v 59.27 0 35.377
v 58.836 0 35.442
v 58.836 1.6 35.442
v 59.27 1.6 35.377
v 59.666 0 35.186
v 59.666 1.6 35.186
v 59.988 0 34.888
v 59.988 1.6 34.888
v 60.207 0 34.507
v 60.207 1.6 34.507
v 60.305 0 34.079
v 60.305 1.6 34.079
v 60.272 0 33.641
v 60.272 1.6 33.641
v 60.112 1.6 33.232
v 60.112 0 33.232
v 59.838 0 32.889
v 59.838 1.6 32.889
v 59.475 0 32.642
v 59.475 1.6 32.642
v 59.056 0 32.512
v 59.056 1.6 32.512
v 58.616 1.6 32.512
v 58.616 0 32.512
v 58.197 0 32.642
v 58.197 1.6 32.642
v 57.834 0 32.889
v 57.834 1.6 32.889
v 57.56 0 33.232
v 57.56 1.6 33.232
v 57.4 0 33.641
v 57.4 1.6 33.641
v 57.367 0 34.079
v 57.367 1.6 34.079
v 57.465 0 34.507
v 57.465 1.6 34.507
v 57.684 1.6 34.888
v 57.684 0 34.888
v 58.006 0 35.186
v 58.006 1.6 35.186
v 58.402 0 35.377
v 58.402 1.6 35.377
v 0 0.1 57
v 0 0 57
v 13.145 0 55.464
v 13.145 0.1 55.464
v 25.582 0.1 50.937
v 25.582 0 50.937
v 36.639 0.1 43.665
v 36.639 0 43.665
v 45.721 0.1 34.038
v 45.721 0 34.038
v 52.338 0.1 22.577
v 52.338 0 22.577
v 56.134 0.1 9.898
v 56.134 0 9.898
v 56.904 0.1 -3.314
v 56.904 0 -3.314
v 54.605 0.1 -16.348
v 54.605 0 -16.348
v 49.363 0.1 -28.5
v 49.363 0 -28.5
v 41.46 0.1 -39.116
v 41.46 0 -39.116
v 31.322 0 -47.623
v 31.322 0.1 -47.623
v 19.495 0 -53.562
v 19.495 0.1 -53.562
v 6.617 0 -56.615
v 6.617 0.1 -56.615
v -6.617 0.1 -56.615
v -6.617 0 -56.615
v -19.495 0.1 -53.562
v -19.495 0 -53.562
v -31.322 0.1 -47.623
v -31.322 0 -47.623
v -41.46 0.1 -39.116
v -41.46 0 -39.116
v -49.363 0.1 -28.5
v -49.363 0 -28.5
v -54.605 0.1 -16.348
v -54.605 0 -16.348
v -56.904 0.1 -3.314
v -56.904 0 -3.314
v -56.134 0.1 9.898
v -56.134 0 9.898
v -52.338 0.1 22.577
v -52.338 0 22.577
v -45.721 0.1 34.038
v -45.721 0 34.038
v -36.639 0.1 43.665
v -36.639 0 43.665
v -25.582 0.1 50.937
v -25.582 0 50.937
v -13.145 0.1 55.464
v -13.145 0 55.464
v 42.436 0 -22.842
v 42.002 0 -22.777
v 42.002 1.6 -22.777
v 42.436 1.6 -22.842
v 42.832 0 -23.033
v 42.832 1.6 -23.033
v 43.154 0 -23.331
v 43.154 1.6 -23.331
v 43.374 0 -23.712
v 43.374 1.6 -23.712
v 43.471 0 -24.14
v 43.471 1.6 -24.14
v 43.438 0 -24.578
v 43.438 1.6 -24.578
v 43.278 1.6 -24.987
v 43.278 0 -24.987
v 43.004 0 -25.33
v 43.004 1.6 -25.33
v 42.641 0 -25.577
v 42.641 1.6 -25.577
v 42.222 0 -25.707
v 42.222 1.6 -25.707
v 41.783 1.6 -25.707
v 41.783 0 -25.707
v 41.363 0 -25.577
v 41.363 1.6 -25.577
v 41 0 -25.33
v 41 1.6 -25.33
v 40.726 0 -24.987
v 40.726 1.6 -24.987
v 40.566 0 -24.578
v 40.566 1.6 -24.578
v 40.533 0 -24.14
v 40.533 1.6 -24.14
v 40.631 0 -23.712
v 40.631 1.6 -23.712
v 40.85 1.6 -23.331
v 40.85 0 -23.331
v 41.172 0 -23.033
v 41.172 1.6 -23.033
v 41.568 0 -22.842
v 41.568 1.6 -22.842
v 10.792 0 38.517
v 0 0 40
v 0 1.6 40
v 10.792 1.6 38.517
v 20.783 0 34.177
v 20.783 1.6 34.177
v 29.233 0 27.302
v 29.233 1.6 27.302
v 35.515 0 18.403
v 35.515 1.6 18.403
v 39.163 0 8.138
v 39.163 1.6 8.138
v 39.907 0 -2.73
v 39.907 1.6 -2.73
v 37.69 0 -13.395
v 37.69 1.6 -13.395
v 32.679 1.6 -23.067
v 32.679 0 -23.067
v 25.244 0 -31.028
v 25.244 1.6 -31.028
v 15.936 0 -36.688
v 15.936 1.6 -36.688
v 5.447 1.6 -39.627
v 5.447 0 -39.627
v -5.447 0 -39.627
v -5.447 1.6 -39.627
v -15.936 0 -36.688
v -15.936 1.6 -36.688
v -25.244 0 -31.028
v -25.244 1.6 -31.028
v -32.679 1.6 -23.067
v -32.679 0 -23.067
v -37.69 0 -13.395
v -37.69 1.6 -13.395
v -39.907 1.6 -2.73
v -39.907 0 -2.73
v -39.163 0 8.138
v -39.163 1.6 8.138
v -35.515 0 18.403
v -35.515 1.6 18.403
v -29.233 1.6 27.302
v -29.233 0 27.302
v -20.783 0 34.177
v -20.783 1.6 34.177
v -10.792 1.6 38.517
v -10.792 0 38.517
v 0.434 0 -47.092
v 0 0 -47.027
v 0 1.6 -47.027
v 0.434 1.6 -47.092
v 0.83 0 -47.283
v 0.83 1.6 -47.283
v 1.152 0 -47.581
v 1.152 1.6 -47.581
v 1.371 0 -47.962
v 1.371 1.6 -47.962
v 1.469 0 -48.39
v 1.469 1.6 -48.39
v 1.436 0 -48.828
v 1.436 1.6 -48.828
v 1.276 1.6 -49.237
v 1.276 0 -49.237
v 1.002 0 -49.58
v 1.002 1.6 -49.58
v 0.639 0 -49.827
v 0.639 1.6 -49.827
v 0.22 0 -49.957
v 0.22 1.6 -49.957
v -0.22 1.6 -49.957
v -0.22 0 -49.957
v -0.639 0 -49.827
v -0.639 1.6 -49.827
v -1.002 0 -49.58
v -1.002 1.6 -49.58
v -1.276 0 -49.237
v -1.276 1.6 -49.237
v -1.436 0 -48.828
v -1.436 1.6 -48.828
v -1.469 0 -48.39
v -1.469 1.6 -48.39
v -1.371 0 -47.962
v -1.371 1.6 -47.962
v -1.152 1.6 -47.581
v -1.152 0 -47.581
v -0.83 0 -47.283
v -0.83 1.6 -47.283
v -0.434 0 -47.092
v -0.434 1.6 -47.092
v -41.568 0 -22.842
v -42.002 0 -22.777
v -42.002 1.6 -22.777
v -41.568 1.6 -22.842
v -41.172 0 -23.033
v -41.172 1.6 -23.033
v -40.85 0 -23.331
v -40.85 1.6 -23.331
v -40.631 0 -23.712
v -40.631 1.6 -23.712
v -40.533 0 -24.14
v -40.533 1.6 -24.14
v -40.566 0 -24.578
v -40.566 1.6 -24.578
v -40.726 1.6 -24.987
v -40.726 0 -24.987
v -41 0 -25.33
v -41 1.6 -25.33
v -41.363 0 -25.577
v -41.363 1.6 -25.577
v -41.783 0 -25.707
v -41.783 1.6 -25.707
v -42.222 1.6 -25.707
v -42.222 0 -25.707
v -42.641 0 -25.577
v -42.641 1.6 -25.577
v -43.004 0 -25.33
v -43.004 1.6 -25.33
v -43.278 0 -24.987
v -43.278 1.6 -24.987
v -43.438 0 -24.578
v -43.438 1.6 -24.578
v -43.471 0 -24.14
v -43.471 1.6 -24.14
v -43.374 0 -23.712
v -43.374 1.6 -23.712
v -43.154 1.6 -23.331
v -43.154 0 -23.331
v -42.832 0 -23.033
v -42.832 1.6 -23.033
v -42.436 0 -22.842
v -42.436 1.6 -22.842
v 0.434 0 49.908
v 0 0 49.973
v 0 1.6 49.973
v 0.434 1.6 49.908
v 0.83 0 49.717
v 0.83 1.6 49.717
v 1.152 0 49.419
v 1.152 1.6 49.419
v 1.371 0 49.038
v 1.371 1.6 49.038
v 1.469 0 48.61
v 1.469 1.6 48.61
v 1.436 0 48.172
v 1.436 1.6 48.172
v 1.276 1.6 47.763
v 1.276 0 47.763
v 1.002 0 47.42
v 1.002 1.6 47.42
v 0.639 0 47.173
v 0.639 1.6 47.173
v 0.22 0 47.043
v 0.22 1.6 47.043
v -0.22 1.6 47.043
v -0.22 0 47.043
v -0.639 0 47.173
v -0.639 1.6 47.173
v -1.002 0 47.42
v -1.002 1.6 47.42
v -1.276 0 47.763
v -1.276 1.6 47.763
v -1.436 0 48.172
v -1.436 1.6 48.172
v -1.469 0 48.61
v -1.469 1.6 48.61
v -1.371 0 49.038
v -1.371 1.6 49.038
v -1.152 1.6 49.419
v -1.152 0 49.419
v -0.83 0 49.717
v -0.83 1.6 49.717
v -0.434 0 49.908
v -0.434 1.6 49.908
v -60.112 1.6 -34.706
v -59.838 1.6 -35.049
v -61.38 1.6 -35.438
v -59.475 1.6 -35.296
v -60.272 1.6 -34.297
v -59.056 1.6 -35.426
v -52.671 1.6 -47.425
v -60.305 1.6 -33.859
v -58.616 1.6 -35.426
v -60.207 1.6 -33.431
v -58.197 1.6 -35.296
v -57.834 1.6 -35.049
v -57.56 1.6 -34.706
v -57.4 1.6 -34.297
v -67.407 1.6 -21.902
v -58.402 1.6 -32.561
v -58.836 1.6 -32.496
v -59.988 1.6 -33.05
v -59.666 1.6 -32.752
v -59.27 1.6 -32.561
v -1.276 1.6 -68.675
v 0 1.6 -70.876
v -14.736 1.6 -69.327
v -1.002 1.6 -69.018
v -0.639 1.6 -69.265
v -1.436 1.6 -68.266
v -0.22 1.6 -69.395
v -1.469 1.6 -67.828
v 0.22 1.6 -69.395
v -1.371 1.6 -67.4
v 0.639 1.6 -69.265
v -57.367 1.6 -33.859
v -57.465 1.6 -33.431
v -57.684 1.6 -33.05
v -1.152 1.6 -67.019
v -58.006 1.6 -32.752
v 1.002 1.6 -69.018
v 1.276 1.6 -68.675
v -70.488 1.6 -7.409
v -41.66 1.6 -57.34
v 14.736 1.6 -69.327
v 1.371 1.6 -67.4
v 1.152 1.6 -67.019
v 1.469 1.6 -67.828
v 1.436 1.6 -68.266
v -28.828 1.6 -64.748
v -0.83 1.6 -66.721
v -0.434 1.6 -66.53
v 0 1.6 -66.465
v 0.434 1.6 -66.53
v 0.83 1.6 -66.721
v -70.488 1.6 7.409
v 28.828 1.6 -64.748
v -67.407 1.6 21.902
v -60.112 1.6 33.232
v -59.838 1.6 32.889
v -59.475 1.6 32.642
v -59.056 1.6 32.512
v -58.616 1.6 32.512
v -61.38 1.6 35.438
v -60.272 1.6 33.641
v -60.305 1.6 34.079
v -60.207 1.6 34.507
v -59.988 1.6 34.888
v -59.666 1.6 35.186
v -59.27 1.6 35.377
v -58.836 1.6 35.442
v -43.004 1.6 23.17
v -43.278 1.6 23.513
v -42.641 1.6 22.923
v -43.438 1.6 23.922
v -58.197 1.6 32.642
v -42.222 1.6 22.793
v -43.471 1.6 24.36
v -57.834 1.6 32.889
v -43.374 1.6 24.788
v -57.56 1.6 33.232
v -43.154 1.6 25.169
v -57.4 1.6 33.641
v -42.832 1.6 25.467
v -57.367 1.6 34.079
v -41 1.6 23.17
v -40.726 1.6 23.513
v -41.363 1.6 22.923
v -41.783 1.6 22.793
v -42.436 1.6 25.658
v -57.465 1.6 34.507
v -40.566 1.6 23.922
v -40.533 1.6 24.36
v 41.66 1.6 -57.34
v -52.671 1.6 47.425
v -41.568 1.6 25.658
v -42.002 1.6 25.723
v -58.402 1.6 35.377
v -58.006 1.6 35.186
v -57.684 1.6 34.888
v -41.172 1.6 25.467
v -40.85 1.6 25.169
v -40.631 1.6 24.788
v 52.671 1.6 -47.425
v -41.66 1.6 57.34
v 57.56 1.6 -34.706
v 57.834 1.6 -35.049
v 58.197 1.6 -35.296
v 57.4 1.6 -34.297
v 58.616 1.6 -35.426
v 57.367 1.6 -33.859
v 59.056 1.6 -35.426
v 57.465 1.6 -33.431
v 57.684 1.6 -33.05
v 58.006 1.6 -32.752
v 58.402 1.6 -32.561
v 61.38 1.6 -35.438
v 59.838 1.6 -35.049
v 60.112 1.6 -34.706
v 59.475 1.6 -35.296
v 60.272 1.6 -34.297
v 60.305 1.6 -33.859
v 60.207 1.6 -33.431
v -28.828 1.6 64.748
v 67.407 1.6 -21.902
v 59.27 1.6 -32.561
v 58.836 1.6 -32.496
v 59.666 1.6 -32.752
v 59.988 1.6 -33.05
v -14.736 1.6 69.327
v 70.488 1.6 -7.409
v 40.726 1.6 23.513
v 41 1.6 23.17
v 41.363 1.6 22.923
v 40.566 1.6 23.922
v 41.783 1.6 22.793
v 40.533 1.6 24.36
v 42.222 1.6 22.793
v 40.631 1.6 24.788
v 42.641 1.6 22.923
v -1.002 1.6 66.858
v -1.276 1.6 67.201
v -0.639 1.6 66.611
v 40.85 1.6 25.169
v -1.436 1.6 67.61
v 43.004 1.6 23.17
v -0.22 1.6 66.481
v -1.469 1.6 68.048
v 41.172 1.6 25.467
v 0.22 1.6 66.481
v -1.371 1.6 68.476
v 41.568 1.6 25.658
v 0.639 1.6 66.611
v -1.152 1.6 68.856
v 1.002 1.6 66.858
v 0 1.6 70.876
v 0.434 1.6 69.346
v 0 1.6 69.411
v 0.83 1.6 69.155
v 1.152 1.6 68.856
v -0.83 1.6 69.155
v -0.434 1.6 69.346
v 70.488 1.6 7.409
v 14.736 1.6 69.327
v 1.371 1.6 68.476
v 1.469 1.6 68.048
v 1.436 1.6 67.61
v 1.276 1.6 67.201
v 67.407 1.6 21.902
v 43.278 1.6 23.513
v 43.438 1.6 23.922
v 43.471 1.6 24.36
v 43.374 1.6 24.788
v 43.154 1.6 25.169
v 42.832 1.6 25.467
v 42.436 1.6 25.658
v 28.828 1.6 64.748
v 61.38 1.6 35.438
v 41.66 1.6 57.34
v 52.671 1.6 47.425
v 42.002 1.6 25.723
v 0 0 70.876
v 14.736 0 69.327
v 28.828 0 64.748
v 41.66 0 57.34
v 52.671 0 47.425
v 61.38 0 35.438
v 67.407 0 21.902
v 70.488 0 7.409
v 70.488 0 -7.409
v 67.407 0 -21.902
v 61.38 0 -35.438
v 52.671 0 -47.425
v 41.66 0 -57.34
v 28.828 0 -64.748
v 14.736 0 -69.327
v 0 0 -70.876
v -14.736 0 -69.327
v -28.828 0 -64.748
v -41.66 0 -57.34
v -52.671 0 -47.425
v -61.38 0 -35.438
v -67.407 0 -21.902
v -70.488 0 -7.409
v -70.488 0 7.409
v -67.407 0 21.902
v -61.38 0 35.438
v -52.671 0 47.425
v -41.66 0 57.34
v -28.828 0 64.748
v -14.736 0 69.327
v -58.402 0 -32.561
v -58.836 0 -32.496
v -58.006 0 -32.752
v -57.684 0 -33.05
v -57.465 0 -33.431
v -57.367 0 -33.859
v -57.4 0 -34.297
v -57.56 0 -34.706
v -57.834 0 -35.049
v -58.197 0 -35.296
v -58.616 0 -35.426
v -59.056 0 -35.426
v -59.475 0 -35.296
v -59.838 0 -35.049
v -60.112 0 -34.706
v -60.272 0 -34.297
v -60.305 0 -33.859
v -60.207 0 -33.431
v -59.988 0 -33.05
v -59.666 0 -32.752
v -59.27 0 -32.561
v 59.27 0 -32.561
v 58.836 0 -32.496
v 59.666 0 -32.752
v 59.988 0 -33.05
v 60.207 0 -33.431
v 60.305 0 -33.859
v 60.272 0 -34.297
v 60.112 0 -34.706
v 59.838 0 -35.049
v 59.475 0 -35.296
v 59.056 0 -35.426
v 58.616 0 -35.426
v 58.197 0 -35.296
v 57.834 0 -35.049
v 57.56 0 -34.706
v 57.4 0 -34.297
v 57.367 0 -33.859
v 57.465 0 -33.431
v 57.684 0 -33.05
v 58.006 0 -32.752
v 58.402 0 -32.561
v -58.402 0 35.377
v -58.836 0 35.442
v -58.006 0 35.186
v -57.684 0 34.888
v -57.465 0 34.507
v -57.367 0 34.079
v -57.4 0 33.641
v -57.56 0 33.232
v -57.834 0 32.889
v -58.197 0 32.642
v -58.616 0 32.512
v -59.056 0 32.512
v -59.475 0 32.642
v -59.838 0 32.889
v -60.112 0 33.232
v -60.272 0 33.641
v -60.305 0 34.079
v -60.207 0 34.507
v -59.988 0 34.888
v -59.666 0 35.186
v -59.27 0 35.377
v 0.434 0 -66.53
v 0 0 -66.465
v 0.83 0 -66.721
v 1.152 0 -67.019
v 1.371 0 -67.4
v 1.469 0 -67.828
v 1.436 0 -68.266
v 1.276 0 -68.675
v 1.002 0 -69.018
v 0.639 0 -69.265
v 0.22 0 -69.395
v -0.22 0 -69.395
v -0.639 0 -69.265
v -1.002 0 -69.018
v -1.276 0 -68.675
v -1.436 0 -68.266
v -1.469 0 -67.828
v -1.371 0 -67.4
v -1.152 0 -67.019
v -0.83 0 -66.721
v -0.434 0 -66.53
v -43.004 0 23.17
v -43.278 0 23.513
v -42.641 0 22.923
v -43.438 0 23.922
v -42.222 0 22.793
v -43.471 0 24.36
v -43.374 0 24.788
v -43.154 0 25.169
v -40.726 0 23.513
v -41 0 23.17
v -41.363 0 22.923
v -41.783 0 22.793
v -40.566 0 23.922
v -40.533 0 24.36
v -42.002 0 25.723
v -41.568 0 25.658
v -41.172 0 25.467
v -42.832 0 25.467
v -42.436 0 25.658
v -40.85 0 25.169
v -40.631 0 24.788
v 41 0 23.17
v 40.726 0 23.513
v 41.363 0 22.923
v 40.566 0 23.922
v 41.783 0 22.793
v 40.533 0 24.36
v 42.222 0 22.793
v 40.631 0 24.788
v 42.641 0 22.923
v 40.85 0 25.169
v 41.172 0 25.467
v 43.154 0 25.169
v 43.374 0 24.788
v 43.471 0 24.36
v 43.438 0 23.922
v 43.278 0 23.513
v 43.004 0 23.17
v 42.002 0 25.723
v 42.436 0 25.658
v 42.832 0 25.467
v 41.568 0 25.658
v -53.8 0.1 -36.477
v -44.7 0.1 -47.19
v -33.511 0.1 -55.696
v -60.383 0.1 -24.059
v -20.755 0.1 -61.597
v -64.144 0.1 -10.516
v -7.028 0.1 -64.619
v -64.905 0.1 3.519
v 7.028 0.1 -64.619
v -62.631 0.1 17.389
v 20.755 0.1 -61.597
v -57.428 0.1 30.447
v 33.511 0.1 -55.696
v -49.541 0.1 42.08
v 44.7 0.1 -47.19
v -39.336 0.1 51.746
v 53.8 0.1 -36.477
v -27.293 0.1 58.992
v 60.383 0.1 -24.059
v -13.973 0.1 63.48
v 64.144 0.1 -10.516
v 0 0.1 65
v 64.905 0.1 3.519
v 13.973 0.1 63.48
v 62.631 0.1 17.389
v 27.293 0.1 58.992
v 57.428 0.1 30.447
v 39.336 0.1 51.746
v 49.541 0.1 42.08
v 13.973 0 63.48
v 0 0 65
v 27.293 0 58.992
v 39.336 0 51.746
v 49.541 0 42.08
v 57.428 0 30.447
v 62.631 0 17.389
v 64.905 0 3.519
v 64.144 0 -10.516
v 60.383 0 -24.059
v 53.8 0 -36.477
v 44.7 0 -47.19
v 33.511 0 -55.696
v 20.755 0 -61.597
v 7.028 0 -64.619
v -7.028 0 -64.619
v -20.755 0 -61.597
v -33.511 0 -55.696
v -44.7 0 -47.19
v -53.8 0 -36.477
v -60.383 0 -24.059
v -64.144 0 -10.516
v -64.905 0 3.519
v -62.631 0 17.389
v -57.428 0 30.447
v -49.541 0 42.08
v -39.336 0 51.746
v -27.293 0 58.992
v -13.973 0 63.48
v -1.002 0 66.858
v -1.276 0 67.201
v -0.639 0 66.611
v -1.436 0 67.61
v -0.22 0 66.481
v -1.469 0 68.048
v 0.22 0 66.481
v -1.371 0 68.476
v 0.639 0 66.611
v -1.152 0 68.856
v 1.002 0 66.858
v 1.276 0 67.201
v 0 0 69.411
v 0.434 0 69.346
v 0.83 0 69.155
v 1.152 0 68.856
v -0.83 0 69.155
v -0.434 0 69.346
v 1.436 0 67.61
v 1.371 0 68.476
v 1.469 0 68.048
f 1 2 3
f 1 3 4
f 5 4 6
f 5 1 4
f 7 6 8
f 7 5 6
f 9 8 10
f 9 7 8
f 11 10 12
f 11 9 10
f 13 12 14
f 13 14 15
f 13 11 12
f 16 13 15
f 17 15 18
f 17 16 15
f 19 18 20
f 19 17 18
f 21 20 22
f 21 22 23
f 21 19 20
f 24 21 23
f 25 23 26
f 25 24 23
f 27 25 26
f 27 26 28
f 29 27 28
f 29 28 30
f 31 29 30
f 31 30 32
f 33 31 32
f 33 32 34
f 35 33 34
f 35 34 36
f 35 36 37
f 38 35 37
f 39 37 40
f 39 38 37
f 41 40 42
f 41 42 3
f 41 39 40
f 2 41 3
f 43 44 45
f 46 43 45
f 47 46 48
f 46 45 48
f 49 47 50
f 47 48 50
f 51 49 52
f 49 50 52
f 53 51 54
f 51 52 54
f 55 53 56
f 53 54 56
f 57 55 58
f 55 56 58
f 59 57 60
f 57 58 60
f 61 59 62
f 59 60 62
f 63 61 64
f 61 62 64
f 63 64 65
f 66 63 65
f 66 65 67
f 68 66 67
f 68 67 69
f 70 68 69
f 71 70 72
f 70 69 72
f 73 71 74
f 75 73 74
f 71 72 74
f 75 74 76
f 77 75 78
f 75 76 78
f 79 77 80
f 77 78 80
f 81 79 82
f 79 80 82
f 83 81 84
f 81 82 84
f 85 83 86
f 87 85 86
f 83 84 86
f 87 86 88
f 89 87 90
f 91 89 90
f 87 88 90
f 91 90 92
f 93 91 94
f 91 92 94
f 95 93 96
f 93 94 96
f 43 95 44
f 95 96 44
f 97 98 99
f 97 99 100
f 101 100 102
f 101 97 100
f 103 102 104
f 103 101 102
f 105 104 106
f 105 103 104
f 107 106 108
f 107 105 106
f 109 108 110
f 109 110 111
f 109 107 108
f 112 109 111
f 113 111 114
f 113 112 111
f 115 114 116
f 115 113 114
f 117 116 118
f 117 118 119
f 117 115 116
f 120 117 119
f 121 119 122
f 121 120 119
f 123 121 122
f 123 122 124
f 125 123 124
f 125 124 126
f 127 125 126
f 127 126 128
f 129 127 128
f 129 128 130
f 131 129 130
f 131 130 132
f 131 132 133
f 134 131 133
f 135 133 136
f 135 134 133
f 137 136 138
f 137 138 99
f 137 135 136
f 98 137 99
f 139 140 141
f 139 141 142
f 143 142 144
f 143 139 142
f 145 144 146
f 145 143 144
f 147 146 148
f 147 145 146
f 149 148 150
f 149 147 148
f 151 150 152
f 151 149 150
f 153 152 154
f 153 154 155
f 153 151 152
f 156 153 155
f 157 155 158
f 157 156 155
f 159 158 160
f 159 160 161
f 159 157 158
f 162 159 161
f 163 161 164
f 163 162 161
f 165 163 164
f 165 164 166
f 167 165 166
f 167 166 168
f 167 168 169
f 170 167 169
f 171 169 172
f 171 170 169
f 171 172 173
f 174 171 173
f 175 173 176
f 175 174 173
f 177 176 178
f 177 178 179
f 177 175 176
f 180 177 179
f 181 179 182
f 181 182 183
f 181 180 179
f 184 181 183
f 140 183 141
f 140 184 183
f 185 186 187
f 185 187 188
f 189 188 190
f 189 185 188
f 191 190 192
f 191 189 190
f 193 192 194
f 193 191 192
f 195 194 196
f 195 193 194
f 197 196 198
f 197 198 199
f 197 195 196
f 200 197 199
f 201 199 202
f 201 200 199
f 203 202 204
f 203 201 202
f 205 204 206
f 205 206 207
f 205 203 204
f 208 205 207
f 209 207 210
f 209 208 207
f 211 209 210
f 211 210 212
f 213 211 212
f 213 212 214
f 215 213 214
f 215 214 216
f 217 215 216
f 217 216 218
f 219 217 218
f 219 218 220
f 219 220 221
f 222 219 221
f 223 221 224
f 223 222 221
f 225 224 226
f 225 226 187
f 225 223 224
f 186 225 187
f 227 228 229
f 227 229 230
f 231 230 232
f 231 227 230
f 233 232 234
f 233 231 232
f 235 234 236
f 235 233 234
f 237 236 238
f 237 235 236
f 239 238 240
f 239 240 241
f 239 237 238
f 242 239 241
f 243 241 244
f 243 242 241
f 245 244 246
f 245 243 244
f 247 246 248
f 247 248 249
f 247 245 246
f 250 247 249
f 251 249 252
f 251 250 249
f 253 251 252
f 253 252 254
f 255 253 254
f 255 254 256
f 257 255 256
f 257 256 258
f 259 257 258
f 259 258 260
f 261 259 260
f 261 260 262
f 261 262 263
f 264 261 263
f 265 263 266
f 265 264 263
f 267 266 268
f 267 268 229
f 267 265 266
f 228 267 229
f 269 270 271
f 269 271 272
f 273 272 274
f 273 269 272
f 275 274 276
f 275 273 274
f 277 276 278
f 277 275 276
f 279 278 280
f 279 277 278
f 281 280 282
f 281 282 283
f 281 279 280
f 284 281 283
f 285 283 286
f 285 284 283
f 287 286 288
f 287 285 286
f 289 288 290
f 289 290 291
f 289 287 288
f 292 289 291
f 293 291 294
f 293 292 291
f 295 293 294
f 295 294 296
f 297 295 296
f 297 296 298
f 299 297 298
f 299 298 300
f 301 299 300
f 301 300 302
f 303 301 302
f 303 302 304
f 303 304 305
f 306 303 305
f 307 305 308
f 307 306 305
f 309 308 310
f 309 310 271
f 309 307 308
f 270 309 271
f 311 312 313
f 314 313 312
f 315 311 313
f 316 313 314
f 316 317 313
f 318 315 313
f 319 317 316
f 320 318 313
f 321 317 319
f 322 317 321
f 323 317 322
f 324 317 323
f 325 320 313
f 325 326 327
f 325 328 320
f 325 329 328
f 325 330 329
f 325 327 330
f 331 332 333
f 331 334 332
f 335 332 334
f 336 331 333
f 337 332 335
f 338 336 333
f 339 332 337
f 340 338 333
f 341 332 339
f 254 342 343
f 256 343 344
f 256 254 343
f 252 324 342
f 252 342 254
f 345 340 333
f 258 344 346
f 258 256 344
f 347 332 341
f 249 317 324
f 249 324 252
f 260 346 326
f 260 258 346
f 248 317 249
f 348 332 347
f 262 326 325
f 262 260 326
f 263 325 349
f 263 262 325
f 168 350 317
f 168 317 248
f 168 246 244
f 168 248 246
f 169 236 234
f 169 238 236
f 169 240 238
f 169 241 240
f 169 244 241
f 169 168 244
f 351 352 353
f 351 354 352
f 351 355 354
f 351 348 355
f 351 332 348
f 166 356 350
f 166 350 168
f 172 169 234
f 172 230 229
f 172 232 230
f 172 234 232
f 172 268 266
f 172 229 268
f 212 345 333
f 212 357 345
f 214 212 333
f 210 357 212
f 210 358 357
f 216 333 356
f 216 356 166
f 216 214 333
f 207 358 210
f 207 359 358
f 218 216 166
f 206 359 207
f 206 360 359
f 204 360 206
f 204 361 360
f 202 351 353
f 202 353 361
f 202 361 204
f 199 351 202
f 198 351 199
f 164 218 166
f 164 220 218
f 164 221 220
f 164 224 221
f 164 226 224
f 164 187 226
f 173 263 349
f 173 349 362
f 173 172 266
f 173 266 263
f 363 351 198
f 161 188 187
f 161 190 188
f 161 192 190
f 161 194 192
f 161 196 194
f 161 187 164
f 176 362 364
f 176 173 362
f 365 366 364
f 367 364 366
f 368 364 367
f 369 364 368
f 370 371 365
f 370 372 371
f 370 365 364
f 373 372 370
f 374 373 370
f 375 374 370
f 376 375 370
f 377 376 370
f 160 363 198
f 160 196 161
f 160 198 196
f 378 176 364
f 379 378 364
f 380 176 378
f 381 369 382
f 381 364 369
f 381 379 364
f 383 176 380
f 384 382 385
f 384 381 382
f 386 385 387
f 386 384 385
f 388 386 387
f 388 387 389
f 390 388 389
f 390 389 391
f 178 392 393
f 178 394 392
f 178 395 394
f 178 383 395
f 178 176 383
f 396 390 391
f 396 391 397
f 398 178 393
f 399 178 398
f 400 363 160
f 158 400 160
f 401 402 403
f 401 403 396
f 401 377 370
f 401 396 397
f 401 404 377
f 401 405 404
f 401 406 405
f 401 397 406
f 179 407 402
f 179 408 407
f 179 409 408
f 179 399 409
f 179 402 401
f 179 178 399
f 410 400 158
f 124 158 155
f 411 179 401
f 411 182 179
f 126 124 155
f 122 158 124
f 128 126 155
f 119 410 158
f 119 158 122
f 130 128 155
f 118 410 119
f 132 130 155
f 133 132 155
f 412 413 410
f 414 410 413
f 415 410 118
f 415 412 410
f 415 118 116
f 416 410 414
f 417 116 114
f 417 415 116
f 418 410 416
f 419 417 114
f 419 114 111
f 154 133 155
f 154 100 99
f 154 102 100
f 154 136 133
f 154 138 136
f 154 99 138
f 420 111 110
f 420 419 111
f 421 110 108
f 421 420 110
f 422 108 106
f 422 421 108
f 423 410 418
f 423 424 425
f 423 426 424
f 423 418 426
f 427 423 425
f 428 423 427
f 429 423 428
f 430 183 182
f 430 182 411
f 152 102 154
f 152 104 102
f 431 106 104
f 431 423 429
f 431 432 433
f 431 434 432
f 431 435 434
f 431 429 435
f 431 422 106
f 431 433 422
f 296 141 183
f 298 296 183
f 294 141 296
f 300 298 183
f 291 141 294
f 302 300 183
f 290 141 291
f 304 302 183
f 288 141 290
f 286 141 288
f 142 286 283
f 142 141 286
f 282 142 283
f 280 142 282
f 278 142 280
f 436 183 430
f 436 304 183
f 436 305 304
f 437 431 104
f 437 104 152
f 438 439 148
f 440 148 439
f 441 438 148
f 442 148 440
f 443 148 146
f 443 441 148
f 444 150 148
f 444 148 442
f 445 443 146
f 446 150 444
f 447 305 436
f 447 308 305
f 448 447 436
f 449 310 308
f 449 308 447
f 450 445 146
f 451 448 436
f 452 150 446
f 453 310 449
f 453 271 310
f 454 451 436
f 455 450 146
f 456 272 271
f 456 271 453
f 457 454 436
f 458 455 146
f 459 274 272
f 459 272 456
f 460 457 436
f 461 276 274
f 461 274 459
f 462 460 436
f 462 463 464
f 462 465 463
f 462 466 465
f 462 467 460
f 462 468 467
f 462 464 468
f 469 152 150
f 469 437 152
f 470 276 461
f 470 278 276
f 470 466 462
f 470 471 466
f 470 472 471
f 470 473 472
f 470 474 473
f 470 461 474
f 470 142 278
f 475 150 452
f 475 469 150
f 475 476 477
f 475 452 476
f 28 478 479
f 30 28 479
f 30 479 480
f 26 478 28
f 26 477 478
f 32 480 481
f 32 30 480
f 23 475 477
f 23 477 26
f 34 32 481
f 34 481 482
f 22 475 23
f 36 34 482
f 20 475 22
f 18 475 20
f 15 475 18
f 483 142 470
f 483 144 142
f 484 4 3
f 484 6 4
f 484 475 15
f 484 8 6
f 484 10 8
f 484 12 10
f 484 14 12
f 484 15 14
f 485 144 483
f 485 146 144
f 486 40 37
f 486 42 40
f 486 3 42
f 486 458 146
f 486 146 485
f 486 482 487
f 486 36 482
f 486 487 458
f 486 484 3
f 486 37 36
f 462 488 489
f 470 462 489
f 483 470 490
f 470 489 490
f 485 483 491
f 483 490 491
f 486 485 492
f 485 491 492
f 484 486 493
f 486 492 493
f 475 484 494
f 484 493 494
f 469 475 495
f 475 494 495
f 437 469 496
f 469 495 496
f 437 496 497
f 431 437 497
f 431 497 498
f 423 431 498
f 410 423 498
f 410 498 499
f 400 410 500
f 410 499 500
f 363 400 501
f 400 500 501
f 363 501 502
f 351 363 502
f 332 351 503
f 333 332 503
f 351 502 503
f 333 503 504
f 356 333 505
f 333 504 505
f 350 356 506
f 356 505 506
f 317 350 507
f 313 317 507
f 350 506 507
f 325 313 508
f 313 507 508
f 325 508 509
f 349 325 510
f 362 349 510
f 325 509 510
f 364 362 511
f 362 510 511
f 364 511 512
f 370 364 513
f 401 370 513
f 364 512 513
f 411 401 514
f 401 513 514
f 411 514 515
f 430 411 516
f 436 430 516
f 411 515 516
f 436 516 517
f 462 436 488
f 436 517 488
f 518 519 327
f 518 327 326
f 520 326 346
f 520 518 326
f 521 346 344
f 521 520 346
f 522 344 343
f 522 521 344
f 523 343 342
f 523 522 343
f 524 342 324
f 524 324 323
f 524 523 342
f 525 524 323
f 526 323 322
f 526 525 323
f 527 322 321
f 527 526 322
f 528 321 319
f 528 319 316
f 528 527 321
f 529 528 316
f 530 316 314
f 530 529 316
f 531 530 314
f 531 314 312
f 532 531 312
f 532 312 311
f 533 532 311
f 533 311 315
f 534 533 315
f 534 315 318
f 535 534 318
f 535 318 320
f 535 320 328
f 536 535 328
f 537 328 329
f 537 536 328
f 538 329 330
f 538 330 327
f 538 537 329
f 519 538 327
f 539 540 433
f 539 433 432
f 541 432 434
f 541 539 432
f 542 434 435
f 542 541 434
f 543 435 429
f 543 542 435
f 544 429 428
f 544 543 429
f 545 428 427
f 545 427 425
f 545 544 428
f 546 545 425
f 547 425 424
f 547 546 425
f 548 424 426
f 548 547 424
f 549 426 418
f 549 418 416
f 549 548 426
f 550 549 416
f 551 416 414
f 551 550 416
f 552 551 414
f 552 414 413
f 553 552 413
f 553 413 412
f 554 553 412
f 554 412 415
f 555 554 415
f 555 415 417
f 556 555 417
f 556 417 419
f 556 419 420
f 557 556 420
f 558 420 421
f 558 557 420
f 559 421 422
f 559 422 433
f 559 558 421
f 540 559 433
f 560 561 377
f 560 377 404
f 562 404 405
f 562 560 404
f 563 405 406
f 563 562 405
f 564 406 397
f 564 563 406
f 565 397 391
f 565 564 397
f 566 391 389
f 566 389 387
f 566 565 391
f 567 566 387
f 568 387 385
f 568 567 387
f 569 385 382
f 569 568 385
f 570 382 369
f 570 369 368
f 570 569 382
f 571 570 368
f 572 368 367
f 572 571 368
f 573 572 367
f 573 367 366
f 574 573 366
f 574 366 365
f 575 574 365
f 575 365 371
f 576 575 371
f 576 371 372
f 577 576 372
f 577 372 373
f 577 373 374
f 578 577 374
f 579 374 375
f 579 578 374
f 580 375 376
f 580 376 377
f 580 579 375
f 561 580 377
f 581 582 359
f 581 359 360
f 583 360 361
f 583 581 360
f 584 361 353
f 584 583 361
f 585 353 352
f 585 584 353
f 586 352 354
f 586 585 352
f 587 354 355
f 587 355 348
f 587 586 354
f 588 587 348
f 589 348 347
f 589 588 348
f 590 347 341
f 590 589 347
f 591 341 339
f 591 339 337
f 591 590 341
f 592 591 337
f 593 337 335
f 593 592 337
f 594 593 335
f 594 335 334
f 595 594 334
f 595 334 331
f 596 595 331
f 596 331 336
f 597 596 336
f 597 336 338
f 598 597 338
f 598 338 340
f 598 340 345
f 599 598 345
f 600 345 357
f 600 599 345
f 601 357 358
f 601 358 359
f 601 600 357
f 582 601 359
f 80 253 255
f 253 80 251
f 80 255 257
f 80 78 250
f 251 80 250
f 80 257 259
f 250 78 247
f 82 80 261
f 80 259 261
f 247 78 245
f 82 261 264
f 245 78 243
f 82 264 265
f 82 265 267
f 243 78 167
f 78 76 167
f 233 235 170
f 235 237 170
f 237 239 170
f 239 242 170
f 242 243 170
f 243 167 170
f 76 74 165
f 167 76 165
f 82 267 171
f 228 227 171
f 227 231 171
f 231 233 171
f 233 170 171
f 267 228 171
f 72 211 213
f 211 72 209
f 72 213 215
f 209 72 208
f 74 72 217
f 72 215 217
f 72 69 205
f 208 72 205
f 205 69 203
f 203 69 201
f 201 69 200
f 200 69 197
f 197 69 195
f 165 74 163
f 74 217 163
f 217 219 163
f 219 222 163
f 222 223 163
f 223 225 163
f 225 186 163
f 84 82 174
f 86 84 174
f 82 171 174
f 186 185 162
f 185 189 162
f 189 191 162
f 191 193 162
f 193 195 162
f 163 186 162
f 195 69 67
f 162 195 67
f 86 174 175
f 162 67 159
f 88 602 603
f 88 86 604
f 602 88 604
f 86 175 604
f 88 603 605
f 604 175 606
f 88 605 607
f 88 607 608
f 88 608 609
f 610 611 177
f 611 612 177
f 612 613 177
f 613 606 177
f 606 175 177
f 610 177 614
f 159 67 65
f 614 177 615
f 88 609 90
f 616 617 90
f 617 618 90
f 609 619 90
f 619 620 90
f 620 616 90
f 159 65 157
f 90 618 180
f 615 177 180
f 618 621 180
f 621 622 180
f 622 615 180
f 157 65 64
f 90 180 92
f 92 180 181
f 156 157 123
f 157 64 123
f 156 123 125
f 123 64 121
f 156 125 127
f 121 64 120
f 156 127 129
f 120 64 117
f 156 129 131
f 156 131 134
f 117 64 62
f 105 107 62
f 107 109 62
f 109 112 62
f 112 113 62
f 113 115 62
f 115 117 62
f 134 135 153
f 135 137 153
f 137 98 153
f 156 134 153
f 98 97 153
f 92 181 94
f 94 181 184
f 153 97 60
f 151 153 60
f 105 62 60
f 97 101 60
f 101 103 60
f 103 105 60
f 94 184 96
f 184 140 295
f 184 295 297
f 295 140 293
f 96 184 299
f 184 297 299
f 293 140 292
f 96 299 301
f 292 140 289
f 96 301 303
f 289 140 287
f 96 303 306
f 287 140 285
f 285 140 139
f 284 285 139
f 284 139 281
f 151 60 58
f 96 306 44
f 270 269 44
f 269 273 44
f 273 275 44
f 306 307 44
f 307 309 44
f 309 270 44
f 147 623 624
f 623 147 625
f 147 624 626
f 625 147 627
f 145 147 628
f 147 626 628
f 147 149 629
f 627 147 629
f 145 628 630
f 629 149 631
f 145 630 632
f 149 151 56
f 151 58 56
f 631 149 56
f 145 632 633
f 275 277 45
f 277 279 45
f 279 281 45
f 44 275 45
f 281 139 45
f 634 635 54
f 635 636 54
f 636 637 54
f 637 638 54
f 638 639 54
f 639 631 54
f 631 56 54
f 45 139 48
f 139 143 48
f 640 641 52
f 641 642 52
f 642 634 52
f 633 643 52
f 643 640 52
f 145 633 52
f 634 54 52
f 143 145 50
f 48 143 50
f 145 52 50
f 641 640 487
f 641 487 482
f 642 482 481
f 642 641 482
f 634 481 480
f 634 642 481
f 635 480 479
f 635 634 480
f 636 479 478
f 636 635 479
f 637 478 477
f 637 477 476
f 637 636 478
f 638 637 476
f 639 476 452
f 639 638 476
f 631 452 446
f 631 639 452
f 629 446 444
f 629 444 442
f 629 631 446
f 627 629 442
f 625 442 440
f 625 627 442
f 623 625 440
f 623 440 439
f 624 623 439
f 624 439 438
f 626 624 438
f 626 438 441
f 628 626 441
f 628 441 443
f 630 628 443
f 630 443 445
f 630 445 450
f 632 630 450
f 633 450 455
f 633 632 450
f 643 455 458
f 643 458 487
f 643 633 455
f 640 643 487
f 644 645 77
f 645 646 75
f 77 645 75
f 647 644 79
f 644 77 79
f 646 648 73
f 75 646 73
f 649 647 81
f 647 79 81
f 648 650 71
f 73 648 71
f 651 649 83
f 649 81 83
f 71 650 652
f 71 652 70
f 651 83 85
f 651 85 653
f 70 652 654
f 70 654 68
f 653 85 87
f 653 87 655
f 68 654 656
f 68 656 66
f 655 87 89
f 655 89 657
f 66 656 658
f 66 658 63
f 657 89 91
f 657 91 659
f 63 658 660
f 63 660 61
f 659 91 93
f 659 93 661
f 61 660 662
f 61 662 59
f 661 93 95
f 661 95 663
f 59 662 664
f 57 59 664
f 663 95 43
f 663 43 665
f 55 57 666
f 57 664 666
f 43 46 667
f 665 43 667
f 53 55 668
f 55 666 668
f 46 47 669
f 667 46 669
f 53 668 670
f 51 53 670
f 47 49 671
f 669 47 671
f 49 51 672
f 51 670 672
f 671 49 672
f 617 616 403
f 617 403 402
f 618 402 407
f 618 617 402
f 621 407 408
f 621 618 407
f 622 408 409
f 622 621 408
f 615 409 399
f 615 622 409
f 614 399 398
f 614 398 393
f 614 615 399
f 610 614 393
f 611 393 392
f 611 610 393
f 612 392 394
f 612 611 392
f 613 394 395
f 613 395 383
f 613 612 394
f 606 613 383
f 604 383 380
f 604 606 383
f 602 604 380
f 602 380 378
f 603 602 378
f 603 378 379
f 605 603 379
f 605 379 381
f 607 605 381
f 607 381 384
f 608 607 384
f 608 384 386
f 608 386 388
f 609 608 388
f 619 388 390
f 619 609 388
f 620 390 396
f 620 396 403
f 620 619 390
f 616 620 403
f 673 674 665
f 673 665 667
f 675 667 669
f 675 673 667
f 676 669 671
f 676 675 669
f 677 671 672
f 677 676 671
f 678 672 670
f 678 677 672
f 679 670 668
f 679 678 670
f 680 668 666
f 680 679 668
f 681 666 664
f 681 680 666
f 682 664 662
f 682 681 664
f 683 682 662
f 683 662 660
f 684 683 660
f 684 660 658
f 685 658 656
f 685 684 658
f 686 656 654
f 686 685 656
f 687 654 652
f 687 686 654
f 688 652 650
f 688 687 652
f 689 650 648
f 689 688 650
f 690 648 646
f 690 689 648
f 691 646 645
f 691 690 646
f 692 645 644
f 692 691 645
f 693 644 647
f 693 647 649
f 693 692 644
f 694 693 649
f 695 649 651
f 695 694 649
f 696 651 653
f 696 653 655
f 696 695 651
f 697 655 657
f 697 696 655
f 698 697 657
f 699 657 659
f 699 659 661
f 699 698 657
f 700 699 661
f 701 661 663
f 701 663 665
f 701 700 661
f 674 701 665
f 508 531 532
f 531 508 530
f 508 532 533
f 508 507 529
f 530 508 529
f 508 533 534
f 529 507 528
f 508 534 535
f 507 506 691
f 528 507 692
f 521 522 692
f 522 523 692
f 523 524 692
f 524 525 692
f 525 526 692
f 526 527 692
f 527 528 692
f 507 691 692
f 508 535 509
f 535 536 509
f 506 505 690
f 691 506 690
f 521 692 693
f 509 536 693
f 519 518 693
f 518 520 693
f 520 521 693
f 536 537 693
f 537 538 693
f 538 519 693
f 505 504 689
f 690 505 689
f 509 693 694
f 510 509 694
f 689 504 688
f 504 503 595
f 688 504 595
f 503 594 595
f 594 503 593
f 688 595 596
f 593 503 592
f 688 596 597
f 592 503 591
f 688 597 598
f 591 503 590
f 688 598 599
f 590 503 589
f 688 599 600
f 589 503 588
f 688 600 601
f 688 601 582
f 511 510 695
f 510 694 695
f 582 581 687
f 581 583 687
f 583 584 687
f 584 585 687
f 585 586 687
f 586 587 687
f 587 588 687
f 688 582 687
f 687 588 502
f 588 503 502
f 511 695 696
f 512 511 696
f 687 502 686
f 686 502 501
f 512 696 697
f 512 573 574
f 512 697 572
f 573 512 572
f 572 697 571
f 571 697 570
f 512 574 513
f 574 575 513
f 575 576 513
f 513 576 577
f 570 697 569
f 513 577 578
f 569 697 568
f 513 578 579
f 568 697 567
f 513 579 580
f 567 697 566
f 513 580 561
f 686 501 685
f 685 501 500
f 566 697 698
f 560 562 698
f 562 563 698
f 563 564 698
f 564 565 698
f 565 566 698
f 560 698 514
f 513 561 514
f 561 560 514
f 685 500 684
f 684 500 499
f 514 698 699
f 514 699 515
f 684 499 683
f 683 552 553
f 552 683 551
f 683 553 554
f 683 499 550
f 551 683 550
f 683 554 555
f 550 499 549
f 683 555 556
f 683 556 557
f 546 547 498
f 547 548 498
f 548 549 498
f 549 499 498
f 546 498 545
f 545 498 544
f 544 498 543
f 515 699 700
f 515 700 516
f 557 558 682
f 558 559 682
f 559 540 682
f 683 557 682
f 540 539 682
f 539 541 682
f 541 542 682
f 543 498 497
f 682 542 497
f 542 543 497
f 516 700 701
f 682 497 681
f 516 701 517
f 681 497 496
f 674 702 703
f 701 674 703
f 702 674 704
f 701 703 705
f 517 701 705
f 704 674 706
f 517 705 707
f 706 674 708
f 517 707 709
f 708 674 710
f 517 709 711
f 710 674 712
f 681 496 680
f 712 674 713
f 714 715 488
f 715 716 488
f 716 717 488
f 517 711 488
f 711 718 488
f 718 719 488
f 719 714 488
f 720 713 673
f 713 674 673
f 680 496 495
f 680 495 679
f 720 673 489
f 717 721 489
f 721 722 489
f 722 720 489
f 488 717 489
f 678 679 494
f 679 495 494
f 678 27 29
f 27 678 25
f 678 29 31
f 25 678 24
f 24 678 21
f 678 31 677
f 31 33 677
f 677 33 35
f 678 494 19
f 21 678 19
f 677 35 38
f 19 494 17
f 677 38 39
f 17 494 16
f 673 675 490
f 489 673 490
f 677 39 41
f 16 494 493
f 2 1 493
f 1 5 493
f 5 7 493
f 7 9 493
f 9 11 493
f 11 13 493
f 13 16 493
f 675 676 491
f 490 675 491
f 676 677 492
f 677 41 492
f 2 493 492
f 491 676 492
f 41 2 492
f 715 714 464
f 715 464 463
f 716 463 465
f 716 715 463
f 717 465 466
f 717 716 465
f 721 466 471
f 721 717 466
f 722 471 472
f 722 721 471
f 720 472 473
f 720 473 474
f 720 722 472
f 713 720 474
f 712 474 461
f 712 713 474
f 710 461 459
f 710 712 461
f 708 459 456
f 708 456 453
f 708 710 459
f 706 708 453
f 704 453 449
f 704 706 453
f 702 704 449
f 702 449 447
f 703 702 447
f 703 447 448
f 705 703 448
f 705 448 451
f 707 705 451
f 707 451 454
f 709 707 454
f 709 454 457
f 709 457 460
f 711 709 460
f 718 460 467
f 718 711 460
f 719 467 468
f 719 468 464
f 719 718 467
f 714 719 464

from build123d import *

# Parameters (mm, degrees)
SKETCH1_R           = 70.8759
SKETCH1_R_2         = 1.4732
SKETCH1_R_3         = 40
BOSS_EXTRUDE1_DEPTH = 1.6
SKETCH1_3_R         = 65
SKETCH1_3_R_2       = 57
CUT_EXTRUDE1_DEPTH  = 0.1


with BuildPart() as part:
    # Sketch1 → Boss-Extrude1 (new body)
    with BuildSketch(Plane(origin=(0, 0, 0), x_dir=(1, 0, 0), z_dir=(0, 1, 0))):
        Circle(SKETCH1_R)
        with Locations((-58.835990581, -33.968975)):
            Circle(SKETCH1_R_2, mode=Mode.SUBTRACT)
        with Locations((0, -67.93795)):
            Circle(SKETCH1_R_2, mode=Mode.SUBTRACT)
        with Locations((58.835990581, -33.968975)):
            Circle(SKETCH1_R_2, mode=Mode.SUBTRACT)
        with Locations((-58.835990581, 33.968975)):
            Circle(SKETCH1_R_2, mode=Mode.SUBTRACT)
        with Locations((0, 67.93795)):
            Circle(SKETCH1_R_2, mode=Mode.SUBTRACT)
        with Locations((58.835990581, 33.968975)):
            Circle(SKETCH1_R_2, mode=Mode.SUBTRACT)
        with Locations((0, 48.5)):
            Circle(SKETCH1_R_2, mode=Mode.SUBTRACT)
        with Locations((-42.002232084, -24.25)):
            Circle(SKETCH1_R_2, mode=Mode.SUBTRACT)
        with Locations((0, -48.5)):
            Circle(SKETCH1_R_2, mode=Mode.SUBTRACT)
        with Locations((42.002232084, -24.25)):
            Circle(SKETCH1_R_2, mode=Mode.SUBTRACT)
        with Locations((-42.002232084, 24.25)):
            Circle(SKETCH1_R_2, mode=Mode.SUBTRACT)
        Circle(SKETCH1_R_3, mode=Mode.SUBTRACT)
        with Locations((42.002232084, 24.25)):
            Circle(SKETCH1_R_2, mode=Mode.SUBTRACT)
    extrude(amount=BOSS_EXTRUDE1_DEPTH)

    # Sketch1<3> → Cut-Extrude1 (cut)
    with BuildSketch(Plane(origin=(0, 0, 0), x_dir=(1, 0, 0), z_dir=(0, 1, 0))):
        Circle(SKETCH1_3_R)
        Circle(SKETCH1_3_R_2, mode=Mode.SUBTRACT)
    extrude(amount=CUT_EXTRUDE1_DEPTH, mode=Mode.SUBTRACT)


solid = part.part
